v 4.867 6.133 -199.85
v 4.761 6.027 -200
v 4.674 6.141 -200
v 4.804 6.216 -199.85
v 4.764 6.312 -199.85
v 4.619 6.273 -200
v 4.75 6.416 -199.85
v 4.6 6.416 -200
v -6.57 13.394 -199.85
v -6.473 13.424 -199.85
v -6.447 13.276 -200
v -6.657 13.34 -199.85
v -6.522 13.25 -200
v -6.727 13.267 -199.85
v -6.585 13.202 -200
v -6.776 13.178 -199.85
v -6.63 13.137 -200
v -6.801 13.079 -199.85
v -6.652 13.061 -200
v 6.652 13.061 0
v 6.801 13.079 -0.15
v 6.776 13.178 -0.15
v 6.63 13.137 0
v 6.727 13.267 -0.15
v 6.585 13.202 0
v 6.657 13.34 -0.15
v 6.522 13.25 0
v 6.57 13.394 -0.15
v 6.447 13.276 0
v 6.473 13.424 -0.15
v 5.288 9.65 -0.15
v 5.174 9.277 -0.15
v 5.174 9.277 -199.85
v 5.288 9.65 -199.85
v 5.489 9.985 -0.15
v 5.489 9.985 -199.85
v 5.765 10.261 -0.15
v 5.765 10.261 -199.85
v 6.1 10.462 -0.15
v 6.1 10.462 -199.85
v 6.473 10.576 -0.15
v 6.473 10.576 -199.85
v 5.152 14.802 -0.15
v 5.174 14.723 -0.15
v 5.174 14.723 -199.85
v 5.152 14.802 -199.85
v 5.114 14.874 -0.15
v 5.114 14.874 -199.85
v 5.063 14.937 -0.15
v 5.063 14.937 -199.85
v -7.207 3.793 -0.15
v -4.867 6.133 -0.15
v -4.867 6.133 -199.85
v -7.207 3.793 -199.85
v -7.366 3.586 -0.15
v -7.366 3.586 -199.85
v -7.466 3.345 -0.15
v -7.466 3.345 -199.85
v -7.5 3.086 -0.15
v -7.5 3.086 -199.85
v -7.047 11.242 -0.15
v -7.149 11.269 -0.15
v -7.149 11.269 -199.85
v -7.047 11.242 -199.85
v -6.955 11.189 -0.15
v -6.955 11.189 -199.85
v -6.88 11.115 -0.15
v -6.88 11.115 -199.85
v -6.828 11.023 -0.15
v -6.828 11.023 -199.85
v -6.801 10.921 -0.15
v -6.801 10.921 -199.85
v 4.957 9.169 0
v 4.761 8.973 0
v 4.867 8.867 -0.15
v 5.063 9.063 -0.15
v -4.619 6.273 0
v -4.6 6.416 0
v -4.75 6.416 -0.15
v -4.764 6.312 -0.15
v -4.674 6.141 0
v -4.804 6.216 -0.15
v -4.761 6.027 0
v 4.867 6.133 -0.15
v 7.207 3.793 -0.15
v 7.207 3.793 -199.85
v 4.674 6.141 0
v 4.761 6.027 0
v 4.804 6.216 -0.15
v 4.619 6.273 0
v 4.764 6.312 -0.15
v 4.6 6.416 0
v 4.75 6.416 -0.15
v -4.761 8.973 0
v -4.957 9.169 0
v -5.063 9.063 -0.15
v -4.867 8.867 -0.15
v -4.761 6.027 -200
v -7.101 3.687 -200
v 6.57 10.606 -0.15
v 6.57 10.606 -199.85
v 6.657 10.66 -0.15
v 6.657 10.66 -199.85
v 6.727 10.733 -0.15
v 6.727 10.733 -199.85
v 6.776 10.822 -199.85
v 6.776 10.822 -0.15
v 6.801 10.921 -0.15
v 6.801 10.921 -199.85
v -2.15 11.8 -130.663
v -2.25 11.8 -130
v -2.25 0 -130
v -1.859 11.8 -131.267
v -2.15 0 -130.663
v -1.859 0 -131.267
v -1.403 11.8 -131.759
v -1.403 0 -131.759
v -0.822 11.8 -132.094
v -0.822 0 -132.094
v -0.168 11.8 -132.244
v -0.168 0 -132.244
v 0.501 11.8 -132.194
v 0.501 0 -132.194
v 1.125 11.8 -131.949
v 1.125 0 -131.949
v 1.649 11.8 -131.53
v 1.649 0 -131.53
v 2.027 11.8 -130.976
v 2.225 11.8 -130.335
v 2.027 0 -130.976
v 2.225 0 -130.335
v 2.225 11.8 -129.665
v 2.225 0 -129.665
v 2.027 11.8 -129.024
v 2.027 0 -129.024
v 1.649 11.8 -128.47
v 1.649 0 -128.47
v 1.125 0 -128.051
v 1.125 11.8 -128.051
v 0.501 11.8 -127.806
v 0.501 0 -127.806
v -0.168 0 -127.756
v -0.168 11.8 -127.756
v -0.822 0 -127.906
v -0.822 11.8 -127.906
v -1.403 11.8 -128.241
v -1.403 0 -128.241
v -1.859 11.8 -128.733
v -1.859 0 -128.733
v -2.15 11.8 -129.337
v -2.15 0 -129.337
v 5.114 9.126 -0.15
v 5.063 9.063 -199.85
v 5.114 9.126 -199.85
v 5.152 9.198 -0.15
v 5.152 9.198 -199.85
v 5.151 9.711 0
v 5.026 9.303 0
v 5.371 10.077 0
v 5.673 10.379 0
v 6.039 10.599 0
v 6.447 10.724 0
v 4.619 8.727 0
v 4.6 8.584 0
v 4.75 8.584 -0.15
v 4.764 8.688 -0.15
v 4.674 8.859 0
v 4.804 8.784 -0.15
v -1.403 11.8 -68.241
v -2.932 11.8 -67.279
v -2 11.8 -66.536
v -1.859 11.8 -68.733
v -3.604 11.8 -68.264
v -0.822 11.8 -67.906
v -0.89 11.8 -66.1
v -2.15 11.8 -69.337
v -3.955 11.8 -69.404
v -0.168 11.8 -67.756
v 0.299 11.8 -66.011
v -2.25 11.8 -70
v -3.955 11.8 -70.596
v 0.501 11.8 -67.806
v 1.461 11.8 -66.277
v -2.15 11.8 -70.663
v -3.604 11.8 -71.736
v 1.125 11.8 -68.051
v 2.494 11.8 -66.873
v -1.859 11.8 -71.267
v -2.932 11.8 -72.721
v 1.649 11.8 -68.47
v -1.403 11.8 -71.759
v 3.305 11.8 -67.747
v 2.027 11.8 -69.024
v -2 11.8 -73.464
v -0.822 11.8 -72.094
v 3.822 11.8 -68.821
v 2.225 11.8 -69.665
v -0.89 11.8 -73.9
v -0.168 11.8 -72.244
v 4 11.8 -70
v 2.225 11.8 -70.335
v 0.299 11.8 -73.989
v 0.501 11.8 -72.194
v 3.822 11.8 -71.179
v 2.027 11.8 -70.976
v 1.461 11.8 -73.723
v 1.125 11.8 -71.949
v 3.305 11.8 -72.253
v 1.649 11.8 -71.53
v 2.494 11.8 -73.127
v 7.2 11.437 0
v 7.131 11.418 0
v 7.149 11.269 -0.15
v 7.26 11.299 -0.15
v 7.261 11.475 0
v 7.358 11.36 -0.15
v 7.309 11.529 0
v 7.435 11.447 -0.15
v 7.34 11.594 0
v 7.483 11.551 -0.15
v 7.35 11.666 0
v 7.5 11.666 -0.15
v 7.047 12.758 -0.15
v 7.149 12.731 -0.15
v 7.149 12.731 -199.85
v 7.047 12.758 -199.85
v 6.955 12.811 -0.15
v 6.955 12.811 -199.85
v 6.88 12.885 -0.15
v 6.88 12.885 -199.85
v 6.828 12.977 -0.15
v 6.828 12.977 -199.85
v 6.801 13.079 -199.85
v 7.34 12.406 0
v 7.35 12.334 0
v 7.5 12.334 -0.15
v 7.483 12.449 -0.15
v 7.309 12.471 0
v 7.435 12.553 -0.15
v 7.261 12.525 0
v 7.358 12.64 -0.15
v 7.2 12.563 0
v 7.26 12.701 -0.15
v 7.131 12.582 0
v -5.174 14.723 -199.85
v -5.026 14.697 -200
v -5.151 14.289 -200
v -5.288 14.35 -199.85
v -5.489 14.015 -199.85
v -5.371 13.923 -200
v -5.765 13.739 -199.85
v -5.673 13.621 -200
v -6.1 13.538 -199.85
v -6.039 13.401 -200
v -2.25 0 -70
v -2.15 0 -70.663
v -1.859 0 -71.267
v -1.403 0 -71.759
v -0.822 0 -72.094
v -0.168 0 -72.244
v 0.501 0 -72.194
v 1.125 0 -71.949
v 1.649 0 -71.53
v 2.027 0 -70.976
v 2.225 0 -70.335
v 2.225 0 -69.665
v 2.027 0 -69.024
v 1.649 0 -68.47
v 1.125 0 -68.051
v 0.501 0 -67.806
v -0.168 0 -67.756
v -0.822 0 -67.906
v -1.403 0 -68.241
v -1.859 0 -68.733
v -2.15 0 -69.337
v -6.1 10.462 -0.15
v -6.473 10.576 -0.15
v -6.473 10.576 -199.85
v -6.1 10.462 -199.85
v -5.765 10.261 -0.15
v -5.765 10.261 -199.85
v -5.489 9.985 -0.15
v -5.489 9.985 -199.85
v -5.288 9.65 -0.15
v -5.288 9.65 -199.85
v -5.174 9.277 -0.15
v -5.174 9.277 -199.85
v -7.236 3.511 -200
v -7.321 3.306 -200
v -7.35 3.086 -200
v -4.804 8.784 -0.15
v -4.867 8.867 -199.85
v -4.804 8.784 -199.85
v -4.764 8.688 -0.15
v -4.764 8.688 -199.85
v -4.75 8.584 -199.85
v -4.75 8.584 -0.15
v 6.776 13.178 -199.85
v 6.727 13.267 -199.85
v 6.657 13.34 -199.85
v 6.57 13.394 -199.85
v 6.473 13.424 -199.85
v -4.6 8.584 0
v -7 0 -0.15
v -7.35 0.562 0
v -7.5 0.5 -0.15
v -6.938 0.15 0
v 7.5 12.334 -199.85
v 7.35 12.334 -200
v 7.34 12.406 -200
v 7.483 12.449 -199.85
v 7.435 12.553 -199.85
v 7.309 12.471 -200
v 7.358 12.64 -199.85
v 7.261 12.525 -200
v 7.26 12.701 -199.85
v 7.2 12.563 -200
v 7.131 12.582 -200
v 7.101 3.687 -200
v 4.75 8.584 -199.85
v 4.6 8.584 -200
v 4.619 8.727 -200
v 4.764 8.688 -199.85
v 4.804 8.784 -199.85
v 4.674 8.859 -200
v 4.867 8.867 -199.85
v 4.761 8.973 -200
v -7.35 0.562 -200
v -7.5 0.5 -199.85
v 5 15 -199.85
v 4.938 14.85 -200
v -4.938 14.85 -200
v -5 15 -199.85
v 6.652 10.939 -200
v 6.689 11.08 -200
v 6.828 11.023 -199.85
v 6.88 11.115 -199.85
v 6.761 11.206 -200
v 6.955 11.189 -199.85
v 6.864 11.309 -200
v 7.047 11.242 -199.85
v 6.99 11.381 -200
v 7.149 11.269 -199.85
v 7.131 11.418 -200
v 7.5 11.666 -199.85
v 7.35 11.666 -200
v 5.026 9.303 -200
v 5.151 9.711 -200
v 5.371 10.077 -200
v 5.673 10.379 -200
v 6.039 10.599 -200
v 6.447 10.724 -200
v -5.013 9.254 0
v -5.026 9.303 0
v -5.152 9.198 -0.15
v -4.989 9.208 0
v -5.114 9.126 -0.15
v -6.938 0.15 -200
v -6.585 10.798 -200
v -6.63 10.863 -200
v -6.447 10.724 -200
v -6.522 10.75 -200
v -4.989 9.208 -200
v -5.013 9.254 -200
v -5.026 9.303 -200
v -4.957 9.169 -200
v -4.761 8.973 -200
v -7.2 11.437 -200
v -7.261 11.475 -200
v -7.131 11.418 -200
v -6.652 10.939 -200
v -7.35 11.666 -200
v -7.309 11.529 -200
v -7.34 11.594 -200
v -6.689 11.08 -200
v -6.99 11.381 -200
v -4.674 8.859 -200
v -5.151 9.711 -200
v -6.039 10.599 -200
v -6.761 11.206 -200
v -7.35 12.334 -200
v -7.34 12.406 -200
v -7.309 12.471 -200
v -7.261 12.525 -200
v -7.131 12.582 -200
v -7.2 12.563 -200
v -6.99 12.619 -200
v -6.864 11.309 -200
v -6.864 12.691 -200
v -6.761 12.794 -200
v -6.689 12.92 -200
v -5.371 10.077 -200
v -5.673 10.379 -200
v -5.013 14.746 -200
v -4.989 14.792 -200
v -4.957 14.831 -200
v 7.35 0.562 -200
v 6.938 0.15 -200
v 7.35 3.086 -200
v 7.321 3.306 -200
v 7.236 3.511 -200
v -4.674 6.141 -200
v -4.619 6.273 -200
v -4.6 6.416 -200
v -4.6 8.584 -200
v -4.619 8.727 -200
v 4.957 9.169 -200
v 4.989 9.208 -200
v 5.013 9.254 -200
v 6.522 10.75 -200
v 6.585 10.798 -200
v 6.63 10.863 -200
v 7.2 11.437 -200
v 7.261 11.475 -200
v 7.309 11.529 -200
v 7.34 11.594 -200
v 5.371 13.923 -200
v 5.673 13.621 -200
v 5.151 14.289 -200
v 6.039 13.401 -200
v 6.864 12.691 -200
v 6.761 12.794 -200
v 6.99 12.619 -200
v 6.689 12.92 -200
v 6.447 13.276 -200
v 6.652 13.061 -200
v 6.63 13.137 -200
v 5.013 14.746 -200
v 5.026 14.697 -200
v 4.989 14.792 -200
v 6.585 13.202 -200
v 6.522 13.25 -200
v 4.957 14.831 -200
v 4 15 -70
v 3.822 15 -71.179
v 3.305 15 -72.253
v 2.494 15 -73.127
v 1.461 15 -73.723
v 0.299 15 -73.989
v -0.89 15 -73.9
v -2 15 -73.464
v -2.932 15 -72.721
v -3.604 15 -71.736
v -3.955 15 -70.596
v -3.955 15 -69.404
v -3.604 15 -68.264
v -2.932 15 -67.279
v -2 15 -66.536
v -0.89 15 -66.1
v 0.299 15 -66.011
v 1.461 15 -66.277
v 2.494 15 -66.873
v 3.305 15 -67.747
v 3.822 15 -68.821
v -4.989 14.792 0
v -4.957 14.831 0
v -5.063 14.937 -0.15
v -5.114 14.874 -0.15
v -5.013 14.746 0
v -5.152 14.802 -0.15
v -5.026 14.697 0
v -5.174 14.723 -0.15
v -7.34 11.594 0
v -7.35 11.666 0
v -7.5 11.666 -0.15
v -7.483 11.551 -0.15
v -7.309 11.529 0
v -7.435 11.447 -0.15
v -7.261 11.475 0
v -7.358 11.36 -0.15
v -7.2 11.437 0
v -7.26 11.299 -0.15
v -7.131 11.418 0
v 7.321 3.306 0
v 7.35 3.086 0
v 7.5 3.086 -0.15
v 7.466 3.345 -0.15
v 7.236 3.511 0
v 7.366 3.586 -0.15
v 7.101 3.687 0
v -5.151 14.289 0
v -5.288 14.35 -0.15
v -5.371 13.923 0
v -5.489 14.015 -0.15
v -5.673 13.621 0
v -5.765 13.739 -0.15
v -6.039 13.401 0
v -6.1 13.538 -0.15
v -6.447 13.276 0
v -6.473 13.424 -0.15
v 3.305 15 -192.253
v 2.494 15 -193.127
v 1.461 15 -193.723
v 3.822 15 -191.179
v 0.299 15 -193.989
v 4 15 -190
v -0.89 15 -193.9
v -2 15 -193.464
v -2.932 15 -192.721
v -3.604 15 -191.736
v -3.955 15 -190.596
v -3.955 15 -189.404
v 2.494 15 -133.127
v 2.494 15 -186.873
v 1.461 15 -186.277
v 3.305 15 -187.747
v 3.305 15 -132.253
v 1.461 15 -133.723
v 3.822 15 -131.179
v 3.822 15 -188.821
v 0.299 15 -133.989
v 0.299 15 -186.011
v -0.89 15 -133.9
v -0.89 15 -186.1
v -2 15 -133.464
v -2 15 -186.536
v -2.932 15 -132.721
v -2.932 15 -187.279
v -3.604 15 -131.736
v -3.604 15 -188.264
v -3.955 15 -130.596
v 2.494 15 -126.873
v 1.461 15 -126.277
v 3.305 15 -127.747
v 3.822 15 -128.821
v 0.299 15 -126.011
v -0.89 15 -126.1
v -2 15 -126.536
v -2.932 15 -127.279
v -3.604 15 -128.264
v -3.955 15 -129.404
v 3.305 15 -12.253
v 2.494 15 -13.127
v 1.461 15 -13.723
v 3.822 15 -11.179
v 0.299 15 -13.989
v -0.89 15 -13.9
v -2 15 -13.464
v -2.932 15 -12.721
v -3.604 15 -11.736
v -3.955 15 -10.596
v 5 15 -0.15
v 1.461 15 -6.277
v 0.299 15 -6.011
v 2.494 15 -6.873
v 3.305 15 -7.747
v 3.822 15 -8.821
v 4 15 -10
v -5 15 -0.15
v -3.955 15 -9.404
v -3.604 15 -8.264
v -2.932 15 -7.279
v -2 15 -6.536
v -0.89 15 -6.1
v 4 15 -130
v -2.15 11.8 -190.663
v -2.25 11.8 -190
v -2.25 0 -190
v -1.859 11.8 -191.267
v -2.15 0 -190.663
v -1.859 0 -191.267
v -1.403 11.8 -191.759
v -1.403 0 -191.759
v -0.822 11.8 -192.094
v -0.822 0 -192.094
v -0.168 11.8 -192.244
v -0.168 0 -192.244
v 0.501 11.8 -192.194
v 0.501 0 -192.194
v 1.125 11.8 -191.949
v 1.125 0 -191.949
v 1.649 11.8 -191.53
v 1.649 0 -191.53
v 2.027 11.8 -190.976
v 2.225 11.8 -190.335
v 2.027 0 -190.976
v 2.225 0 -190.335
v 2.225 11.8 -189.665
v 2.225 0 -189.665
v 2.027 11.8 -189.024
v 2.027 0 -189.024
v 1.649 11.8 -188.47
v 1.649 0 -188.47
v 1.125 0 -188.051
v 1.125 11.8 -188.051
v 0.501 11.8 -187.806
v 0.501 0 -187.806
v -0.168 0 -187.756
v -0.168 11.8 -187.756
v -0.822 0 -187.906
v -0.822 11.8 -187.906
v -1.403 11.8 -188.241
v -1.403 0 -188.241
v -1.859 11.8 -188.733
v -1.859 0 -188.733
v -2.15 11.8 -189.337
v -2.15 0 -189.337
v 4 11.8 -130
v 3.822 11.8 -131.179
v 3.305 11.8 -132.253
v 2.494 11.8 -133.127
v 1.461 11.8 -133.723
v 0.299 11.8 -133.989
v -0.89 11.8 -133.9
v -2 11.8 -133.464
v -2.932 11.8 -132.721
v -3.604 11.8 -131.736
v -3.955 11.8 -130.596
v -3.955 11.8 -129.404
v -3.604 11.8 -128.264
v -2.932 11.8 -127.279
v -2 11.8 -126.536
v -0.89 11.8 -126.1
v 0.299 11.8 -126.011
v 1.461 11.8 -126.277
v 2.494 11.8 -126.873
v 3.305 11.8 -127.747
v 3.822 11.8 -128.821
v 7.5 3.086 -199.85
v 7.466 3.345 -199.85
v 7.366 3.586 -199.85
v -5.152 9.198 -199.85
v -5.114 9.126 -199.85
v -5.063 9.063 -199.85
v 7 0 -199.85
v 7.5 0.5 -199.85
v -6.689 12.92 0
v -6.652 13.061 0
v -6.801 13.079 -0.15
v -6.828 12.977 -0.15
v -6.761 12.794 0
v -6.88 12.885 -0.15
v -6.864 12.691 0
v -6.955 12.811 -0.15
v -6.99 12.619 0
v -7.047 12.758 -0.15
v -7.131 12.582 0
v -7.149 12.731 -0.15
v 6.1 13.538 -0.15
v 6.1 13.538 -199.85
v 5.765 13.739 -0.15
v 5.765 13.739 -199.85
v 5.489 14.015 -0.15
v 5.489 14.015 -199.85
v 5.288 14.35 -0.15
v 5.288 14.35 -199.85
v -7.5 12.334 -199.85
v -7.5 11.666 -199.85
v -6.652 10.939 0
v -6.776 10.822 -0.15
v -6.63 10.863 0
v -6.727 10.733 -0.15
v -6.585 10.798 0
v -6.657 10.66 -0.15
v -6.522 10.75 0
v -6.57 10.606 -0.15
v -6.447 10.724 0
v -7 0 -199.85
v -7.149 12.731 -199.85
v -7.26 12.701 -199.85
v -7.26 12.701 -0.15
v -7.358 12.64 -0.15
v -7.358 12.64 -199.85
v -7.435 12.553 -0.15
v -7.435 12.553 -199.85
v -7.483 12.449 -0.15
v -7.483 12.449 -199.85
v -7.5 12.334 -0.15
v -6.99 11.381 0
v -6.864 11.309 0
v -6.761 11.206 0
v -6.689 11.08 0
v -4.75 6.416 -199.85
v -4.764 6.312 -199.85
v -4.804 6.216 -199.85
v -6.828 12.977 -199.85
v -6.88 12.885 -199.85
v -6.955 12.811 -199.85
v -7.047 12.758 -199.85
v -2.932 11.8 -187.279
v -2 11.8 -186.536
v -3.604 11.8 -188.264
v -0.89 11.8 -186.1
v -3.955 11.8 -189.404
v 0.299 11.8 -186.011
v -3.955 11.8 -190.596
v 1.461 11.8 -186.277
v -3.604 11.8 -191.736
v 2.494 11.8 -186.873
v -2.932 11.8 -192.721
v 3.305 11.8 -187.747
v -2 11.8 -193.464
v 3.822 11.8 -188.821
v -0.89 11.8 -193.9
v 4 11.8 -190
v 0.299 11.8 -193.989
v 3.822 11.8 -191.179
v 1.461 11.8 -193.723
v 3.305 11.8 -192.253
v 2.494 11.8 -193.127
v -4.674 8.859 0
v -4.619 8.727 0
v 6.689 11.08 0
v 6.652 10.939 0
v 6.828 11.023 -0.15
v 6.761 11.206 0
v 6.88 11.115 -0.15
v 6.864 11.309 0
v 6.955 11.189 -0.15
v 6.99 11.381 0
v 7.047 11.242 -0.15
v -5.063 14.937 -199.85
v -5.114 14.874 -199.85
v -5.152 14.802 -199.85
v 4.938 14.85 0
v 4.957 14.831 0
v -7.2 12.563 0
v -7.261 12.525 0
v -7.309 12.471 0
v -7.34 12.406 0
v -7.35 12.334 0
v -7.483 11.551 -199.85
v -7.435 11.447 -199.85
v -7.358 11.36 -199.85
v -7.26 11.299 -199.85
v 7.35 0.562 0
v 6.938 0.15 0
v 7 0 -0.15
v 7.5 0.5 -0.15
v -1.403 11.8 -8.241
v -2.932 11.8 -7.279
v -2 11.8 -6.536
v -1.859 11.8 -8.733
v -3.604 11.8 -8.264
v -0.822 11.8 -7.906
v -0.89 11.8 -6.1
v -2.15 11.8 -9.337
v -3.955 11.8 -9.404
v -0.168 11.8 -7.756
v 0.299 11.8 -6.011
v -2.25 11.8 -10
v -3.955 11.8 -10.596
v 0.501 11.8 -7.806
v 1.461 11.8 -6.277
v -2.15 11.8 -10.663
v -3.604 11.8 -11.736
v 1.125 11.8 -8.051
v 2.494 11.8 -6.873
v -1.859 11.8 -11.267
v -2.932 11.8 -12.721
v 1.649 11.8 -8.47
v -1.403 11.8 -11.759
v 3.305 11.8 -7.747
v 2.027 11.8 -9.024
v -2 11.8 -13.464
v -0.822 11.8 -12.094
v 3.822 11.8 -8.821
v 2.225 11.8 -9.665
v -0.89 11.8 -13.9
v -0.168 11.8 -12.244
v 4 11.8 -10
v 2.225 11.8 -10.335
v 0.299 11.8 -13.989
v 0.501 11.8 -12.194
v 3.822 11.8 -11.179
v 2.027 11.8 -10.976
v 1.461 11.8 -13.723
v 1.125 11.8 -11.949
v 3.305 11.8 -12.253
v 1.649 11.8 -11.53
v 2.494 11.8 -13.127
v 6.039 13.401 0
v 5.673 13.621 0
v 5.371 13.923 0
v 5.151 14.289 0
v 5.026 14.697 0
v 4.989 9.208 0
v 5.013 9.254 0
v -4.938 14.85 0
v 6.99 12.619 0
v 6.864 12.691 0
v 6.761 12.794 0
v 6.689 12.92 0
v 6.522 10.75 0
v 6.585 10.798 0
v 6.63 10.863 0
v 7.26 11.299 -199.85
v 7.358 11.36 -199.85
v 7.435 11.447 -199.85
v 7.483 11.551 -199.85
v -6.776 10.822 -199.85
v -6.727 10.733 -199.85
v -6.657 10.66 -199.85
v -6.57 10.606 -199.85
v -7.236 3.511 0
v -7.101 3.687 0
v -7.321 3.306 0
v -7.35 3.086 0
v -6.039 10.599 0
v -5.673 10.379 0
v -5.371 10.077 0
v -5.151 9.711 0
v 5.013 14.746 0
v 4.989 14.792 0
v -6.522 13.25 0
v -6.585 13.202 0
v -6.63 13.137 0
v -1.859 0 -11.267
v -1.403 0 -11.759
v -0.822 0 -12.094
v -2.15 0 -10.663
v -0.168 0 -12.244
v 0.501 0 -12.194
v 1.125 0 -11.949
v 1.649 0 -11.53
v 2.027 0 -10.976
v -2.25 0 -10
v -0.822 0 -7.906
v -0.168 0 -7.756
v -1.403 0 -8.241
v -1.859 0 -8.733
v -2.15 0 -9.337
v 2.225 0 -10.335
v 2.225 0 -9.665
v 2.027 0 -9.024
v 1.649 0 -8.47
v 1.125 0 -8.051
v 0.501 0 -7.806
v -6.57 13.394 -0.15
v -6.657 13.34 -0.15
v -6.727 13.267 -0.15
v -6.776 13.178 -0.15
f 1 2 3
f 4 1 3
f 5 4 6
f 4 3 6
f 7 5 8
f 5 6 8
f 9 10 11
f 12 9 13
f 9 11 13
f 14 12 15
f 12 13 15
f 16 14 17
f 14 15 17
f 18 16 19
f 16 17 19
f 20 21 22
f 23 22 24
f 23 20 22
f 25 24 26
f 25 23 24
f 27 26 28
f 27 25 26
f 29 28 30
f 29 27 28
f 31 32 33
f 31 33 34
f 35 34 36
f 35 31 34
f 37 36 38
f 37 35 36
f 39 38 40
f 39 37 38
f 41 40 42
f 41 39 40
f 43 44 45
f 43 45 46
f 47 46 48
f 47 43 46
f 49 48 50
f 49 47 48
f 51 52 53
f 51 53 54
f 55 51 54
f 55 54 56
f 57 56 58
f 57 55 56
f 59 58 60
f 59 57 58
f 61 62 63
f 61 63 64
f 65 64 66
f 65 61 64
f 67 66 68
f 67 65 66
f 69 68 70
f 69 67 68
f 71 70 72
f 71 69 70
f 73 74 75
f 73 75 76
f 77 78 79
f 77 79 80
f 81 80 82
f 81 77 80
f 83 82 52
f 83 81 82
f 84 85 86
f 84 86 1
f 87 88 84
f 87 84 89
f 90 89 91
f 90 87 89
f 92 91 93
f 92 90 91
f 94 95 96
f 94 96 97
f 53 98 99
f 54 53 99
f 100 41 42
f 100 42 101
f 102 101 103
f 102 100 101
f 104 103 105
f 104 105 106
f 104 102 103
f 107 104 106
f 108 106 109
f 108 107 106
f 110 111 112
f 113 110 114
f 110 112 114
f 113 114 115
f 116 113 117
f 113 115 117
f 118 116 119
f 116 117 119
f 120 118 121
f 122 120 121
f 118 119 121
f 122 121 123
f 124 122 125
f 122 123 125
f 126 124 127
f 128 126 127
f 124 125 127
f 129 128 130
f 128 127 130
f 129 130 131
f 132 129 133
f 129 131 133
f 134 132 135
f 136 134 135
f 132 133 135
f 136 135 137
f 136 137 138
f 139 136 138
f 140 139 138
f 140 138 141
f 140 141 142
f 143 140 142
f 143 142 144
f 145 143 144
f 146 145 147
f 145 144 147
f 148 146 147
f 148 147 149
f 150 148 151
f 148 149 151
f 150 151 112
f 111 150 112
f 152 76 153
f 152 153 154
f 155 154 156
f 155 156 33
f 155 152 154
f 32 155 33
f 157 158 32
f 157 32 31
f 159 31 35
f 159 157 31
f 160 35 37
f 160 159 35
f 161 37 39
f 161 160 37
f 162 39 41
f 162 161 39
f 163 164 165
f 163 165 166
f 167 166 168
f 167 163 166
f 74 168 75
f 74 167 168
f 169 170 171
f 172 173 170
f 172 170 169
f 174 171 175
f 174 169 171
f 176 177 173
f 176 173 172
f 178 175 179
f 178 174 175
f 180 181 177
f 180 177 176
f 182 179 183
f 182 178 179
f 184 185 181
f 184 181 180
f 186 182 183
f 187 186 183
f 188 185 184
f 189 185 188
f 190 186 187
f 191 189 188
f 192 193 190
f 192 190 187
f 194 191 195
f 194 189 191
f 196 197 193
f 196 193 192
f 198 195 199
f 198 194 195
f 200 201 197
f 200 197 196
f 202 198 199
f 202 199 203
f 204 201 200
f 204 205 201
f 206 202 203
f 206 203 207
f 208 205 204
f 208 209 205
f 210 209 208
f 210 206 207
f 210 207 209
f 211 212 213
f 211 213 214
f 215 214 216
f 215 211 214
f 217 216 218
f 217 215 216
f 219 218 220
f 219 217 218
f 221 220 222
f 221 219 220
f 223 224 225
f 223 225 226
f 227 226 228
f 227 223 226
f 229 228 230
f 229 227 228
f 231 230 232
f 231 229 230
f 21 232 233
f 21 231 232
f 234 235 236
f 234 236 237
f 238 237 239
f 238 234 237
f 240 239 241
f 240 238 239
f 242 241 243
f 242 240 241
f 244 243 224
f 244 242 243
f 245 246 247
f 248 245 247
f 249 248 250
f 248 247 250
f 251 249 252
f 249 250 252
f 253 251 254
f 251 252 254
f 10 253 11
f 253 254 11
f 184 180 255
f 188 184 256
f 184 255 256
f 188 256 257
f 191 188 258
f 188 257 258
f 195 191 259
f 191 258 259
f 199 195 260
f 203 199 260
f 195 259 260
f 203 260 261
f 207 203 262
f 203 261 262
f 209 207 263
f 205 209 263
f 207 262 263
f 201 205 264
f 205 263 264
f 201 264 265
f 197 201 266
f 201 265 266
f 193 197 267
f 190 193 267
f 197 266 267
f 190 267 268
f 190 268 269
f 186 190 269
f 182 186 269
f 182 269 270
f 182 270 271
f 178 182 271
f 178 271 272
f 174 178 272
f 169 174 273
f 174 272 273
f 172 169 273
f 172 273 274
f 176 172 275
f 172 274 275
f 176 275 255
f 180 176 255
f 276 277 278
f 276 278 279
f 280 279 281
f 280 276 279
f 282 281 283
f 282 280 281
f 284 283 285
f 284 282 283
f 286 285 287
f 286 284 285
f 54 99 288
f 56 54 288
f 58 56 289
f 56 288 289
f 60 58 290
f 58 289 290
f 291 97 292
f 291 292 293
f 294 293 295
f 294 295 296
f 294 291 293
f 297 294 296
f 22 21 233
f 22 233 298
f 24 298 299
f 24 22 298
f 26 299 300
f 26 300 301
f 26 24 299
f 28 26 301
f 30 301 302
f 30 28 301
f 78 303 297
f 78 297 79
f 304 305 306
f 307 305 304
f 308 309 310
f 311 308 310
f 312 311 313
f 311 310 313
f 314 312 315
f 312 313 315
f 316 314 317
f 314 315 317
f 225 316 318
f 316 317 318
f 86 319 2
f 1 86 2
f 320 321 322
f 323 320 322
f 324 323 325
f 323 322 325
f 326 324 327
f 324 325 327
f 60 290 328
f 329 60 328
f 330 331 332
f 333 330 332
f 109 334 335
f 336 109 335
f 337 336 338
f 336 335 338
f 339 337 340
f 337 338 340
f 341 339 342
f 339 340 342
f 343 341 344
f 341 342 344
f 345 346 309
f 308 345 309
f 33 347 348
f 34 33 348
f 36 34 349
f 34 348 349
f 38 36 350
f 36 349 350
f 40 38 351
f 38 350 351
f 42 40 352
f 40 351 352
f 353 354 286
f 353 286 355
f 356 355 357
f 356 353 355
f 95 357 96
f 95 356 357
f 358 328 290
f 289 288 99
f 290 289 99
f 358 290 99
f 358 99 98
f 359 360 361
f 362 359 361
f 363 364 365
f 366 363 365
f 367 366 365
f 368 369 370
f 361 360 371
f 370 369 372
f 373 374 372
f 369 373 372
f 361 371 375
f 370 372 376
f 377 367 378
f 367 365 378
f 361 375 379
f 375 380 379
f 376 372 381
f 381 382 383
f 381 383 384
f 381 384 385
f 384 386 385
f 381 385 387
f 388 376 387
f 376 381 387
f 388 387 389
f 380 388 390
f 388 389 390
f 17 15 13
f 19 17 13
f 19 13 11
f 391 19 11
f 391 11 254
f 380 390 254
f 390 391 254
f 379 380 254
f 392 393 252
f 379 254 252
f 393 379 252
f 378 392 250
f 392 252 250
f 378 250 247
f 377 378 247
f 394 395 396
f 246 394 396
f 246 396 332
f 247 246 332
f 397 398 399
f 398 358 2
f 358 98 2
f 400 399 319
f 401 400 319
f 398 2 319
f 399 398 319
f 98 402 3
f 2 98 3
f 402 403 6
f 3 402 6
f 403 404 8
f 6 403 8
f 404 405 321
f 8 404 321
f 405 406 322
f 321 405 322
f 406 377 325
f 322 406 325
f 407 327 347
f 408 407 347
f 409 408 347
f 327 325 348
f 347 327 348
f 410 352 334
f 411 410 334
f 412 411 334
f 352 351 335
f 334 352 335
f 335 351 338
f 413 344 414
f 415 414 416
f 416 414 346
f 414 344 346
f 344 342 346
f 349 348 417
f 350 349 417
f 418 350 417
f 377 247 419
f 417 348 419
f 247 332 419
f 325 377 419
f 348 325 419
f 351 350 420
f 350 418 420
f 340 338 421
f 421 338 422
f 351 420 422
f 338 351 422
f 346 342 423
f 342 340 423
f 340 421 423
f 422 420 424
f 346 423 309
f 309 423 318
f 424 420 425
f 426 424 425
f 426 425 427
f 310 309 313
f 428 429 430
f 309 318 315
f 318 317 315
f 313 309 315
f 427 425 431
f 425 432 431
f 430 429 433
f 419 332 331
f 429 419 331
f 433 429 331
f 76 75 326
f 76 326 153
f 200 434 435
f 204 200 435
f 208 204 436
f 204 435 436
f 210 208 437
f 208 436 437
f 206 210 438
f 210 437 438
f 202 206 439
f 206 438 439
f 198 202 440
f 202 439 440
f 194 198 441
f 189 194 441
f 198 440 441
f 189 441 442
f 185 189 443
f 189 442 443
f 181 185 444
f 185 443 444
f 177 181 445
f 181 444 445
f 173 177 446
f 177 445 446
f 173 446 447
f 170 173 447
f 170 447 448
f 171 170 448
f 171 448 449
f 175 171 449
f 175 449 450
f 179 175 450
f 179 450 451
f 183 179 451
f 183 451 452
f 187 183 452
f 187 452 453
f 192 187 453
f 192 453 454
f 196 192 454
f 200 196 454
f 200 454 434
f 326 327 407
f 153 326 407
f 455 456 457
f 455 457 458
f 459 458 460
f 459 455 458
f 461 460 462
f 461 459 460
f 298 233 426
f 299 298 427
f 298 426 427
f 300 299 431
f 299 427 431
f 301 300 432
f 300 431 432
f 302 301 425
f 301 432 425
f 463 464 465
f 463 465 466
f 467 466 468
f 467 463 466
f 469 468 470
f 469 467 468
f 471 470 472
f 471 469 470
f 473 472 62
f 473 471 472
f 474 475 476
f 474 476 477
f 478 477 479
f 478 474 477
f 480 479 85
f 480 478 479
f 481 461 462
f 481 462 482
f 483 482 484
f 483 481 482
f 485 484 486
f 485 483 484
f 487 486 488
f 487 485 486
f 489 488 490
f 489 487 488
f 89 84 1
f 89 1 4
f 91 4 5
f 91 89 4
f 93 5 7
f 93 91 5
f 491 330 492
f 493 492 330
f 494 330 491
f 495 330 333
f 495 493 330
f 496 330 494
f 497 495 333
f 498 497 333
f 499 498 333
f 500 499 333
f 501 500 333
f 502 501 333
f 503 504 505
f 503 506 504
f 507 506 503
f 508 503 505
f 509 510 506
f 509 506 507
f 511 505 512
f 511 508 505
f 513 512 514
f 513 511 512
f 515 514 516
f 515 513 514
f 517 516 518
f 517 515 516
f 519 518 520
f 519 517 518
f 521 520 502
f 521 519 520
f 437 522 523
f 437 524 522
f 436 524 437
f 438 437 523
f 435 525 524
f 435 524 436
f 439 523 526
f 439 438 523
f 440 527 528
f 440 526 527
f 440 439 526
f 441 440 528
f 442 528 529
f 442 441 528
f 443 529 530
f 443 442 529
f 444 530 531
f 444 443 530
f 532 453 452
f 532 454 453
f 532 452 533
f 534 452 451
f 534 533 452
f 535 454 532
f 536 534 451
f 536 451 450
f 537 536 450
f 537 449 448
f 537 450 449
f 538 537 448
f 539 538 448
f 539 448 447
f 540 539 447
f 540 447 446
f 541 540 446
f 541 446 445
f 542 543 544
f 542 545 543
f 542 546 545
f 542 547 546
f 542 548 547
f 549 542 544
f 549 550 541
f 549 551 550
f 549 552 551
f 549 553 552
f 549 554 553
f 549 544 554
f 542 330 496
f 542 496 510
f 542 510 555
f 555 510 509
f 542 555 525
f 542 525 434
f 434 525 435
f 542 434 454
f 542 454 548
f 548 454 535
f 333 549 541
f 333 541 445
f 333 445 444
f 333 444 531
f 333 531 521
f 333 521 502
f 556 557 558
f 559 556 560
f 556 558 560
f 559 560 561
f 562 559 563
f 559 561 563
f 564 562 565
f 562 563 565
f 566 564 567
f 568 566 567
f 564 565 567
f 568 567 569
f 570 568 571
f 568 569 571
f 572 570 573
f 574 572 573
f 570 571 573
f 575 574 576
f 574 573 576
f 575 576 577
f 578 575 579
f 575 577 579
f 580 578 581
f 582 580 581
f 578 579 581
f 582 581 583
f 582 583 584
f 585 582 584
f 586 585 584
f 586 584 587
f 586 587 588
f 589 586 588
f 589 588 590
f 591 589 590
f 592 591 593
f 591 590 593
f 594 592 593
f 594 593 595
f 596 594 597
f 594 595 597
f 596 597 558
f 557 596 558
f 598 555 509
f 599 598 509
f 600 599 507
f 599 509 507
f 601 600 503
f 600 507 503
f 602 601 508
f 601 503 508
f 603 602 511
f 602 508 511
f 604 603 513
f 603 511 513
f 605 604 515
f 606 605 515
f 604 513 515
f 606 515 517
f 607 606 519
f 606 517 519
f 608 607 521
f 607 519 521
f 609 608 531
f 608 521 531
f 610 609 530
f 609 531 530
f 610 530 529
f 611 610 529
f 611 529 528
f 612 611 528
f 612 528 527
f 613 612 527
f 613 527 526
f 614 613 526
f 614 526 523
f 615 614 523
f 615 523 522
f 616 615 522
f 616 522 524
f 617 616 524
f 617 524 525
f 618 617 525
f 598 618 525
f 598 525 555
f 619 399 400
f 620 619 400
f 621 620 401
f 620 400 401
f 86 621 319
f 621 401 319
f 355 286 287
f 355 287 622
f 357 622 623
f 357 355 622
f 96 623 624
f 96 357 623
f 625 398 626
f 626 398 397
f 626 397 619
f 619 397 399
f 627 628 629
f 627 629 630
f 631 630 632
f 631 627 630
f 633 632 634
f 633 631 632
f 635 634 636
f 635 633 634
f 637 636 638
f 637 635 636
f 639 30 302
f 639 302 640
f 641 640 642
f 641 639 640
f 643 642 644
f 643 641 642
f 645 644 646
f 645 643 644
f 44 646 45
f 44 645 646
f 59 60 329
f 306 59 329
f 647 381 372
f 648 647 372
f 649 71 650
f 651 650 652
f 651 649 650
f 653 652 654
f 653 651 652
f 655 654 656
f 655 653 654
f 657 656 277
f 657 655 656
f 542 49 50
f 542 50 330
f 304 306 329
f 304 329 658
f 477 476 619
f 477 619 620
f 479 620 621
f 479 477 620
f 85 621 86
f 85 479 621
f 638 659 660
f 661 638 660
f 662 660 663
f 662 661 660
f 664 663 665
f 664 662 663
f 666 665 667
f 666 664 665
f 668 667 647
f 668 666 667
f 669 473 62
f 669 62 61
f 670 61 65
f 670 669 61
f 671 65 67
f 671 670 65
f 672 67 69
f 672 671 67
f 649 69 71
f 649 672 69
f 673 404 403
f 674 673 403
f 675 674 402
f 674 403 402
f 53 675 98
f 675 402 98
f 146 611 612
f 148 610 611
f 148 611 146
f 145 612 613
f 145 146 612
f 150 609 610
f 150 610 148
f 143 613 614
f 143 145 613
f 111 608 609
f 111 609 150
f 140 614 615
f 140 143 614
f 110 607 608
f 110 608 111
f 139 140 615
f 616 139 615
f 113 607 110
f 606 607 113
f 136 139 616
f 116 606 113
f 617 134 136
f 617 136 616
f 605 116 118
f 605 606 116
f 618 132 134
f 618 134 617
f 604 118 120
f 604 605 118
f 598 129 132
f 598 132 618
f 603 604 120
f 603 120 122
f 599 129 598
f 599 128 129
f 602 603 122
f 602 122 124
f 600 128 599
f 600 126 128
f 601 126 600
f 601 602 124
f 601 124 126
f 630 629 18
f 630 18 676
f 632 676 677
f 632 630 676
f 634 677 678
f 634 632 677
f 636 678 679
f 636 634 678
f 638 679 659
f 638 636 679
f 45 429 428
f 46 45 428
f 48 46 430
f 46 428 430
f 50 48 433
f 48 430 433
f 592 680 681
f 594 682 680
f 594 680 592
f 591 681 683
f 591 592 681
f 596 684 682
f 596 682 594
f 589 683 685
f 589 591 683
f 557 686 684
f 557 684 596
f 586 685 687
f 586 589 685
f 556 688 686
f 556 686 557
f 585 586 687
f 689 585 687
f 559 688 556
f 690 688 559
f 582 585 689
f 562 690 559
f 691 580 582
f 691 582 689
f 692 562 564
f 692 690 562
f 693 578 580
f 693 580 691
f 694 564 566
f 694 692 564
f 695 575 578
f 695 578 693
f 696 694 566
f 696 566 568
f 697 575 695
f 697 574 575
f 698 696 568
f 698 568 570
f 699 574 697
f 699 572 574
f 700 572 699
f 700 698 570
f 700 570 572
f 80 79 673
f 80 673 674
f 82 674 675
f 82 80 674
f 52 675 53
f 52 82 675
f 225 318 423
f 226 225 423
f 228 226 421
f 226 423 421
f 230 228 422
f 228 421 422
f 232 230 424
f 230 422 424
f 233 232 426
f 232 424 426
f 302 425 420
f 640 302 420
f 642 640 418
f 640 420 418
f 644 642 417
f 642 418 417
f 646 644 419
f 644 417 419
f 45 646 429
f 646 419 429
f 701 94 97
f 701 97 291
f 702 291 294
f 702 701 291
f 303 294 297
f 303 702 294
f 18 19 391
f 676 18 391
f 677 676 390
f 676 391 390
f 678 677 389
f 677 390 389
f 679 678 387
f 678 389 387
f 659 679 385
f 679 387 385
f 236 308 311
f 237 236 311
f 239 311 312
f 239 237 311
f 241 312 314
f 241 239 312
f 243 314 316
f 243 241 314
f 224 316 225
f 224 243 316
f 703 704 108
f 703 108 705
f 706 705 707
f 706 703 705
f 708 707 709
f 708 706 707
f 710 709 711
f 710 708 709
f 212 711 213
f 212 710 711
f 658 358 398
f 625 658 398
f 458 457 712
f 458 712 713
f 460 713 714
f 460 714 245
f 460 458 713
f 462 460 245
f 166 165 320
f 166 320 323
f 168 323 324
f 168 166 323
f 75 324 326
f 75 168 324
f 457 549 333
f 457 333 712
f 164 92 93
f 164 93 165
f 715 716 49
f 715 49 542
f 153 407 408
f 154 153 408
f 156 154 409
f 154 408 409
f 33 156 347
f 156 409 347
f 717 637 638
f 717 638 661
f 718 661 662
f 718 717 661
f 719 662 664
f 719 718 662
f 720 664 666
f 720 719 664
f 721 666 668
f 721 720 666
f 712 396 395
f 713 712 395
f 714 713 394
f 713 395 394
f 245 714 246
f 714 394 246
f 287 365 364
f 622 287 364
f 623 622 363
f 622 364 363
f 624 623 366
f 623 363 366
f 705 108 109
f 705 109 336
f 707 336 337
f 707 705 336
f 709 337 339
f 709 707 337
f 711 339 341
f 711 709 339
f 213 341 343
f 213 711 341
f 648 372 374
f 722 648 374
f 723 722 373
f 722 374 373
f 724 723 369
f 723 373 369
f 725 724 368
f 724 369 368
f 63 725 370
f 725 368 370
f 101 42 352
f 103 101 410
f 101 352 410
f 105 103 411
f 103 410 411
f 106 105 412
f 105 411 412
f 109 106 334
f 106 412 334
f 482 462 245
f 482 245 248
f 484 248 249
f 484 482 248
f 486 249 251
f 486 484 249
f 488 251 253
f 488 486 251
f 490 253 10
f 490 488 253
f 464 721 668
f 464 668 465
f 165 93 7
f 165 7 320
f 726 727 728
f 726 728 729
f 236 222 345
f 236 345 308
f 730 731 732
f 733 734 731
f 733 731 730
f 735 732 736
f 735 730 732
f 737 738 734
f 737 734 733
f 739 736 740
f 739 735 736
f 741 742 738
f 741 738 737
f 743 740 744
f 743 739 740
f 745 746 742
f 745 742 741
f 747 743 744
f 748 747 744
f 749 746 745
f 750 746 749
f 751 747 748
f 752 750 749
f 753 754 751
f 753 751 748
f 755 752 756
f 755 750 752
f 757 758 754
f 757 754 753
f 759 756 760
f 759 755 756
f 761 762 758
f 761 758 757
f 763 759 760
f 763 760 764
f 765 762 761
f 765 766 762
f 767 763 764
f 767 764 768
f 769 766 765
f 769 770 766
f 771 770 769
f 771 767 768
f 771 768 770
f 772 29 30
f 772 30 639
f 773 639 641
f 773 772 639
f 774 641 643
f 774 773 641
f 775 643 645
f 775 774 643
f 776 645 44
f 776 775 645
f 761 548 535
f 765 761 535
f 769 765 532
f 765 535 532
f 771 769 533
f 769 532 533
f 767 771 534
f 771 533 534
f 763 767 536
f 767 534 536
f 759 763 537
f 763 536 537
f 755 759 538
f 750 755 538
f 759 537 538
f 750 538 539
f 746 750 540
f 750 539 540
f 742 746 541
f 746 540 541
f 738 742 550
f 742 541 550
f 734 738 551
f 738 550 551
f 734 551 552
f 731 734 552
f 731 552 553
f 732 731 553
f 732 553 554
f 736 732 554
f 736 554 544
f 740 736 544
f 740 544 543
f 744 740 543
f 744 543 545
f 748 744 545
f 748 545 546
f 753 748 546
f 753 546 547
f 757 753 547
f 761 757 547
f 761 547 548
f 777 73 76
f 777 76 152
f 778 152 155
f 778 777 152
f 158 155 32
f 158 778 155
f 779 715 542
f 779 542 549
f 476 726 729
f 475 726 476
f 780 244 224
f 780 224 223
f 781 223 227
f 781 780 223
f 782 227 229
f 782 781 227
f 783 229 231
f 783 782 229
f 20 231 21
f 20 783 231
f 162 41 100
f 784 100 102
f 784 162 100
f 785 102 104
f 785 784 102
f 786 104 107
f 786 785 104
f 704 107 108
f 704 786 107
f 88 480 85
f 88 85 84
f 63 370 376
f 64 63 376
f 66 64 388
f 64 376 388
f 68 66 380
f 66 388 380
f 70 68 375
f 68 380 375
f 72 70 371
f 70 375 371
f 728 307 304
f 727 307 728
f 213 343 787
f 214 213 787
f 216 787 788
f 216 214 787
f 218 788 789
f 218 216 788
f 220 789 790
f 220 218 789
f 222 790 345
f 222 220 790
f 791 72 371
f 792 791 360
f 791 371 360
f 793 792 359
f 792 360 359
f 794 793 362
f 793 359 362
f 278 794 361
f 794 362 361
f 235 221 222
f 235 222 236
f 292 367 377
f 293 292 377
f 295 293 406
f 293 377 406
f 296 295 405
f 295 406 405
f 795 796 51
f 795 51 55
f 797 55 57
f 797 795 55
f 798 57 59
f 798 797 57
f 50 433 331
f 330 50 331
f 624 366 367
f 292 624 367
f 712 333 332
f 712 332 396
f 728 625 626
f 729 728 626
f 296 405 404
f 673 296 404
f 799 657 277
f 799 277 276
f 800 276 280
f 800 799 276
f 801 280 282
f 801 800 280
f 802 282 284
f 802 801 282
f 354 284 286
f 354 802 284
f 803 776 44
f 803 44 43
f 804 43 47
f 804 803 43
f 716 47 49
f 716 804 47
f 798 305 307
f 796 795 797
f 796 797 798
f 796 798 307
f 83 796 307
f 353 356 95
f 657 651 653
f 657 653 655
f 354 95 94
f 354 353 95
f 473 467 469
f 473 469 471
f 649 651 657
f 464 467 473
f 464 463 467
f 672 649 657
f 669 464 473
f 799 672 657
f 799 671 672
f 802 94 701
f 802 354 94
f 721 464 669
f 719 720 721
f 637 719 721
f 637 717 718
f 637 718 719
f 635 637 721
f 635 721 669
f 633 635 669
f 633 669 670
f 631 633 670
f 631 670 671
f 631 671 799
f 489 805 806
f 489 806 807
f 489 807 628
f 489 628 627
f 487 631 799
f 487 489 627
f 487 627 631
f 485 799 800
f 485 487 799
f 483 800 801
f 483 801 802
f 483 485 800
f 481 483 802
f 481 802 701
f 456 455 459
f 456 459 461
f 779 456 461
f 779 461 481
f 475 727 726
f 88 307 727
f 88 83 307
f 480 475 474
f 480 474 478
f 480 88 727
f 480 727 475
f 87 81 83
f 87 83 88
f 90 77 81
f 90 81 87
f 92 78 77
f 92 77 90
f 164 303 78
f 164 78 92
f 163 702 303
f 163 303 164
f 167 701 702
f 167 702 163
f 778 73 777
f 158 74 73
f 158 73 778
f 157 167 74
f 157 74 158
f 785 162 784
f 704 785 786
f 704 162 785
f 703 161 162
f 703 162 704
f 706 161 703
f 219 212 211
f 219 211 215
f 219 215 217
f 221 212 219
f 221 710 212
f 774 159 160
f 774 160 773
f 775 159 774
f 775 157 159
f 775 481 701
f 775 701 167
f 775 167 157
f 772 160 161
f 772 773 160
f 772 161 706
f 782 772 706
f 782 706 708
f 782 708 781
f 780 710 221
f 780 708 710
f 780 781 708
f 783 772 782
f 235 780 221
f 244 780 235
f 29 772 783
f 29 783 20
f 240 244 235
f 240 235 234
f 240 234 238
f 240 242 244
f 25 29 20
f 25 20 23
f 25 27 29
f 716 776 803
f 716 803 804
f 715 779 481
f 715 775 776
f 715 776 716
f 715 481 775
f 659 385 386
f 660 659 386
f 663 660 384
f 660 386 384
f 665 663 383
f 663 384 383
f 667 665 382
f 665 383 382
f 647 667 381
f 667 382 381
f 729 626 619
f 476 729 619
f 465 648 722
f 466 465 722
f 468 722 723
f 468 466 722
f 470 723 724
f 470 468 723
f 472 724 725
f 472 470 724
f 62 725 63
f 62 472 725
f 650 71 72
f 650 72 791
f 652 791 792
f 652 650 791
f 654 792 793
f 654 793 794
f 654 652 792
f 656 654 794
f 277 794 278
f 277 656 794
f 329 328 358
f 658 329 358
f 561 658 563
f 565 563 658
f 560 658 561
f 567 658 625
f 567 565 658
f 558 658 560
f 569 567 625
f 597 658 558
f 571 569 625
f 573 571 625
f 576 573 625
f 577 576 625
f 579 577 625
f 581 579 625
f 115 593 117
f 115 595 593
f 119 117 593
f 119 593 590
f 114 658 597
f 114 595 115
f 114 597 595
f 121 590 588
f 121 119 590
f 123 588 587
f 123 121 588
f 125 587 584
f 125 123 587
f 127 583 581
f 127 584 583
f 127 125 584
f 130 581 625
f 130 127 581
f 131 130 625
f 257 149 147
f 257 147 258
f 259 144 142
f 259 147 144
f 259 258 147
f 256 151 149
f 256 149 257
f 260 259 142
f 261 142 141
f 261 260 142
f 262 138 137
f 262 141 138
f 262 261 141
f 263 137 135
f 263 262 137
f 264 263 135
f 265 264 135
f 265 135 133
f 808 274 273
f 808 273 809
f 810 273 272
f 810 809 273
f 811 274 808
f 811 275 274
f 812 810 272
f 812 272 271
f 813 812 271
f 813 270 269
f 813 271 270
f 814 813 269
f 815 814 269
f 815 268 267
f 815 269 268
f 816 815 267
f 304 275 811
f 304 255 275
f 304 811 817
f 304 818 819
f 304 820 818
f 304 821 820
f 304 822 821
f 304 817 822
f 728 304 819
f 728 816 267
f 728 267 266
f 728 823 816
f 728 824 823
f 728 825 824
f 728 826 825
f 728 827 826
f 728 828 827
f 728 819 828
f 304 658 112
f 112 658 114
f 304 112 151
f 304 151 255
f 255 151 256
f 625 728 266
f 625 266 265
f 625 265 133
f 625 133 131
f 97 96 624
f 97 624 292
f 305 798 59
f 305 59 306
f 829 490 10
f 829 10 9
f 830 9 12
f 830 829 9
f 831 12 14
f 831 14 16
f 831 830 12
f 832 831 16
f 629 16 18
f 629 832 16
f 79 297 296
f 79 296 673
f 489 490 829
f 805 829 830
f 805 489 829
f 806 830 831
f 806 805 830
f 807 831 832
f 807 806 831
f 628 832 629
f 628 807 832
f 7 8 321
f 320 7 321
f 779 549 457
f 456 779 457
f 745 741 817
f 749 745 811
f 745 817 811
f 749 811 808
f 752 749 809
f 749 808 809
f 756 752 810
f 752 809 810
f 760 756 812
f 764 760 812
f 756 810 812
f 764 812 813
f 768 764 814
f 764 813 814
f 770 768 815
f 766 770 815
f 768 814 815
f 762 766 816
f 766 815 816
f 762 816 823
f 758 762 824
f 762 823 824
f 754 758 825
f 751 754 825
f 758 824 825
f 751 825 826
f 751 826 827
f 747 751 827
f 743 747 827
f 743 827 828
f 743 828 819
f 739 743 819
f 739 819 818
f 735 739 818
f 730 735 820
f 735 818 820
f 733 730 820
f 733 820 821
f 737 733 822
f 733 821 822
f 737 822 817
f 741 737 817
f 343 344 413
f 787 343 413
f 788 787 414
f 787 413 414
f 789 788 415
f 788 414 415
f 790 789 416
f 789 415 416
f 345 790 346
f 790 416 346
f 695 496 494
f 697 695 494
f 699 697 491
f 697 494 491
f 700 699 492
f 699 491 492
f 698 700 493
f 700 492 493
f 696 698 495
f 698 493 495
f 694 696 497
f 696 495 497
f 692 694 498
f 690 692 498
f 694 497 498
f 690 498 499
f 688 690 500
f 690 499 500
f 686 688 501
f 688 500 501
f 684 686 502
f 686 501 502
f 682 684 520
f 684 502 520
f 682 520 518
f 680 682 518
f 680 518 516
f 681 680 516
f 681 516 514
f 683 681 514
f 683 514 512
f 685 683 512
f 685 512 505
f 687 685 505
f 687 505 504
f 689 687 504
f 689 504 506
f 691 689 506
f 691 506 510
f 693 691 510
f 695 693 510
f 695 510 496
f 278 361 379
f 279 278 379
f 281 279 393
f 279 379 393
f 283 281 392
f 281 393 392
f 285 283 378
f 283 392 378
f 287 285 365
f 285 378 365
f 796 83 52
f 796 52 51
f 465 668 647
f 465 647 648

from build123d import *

# Parameters (mm, degrees)
BODY_DEPTH                                          = 200
AESTHETIC_CHAMFER_SIZE                              = 0.15
CBORE_FOR_M4_HEX_SOCKET_HEAD_CAP_SCREW1_D           = 4.5
CBORE_FOR_M4_HEX_SOCKET_HEAD_CAP_SCREW1_CBORE_D     = 8
CBORE_FOR_M4_HEX_SOCKET_HEAD_CAP_SCREW1_CBORE_DEPTH = 3.2
LPATTERN1_COUNT                                     = 4
LPATTERN1_PITCH                                     = 60


with BuildPart() as part:
    # Rail Profile → Body (new body)
    with BuildSketch(Plane.XY):
        with BuildLine():
            Line((-7, 0), (7, 0))
            Line((7, 0), (7.5, 0.5))
            Line((7.5, 0.5), (7.5, 3.085786438))
            ThreePointArc((7.5, 3.085786438), (7.423879533, 3.46846987), (7.207106781, 3.792893219))
            Line((7.207106781, 3.792893219), (4.867157288, 6.132842712))
            ThreePointArc((4.867157288, 6.132842712), (4.780448187, 6.262612052), (4.75, 6.415685425))
            Line((4.75, 6.415685425), (4.75, 8.584314575))
            ThreePointArc((4.75, 8.584314575), (4.780448187, 8.737387948), (4.867157288, 8.867157288))
            Line((4.867157288, 8.867157288), (5.062965362, 9.062965362))
            ThreePointArc((5.062965362, 9.062965362), (5.134996734, 9.161242682), (5.17409812, 9.27664646))
            ThreePointArc((5.17409812, 9.27664646), (5.61862915, 10.13137085), (6.47335354, 10.57590188))
            ThreePointArc((6.47335354, 10.57590188), (6.694124352, 10.694306692), (6.801170165, 10.920803148))
            ThreePointArc((6.801170165, 10.920803148), (6.915305692, 11.154571658), (7.149074202, 11.268707185))
            ThreePointArc((7.149074202, 11.268707185), (7.399691242, 11.400760606), (7.5, 11.665685425))
            Line((7.5, 11.665685425), (7.5, 12.334314575))
            ThreePointArc((7.5, 12.334314575), (7.399691242, 12.599239394), (7.149074202, 12.731292815))
            ThreePointArc((7.149074202, 12.731292815), (6.915305692, 12.845428342), (6.801170165, 13.079196852))
            ThreePointArc((6.801170165, 13.079196852), (6.694124352, 13.305693308), (6.47335354, 13.42409812))
            ThreePointArc((6.47335354, 13.42409812), (5.61862915, 13.86862915), (5.17409812, 14.72335354))
            ThreePointArc((5.17409812, 14.72335354), (5.134996734, 14.838757318), (5.062965362, 14.937034638))
            Line((5.062965362, 14.937034638), (5, 15))
            Line((5, 15), (-5, 15))
            Line((-5, 15), (-5.062965362, 14.937034638))
            ThreePointArc((-5.062965362, 14.937034638), (-5.134996734, 14.838757318), (-5.17409812, 14.72335354))
            ThreePointArc((-5.17409812, 14.72335354), (-5.61862915, 13.86862915), (-6.47335354, 13.42409812))
            ThreePointArc((-6.47335354, 13.42409812), (-6.694124352, 13.305693308), (-6.801170165, 13.079196852))
            ThreePointArc((-6.801170165, 13.079196852), (-6.915305692, 12.845428342), (-7.149074202, 12.731292815))
            ThreePointArc((-7.149074202, 12.731292815), (-7.399691242, 12.599239394), (-7.5, 12.334314575))
            Line((-7.5, 12.334314575), (-7.5, 11.665685425))
            ThreePointArc((-7.5, 11.665685425), (-7.399691242, 11.400760606), (-7.149074202, 11.268707185))
            ThreePointArc((-7.149074202, 11.268707185), (-6.915305692, 11.154571658), (-6.801170165, 10.920803148))
            ThreePointArc((-6.801170165, 10.920803148), (-6.694124352, 10.694306692), (-6.47335354, 10.57590188))
            ThreePointArc((-6.47335354, 10.57590188), (-5.61862915, 10.13137085), (-5.17409812, 9.27664646))
            ThreePointArc((-5.17409812, 9.27664646), (-5.134996734, 9.161242682), (-5.062965362, 9.062965362))
            Line((-5.062965362, 9.062965362), (-4.867157288, 8.867157288))
            ThreePointArc((-4.867157288, 8.867157288), (-4.780448187, 8.737387948), (-4.75, 8.584314575))
            Line((-4.75, 8.584314575), (-4.75, 6.415685425))
            ThreePointArc((-4.75, 6.415685425), (-4.780448187, 6.262612052), (-4.867157288, 6.132842712))
            Line((-4.867157288, 6.132842712), (-7.207106781, 3.792893219))
            ThreePointArc((-7.207106781, 3.792893219), (-7.423879533, 3.46846987), (-7.5, 3.085786438))
            Line((-7.5, 3.085786438), (-7.5, 0.5))
            Line((-7.5, 0.5), (-7, 0))
        make_face()
    extrude(amount=-BODY_DEPTH)

    # Aesthetic Chamfer
    aesthetic_chamfer_edges = [part.edges().sort_by_distance(p)[0] for p in [
        (7.423879533, 3.46846987, -200),
        (-5.134996734, 9.161242682, -200),
        (-4.965061325, 8.965061325, -200),
        (-4.780448187, 8.737387948, -200),
        (-4.75, 7.5, -200),
        (-4.780448187, 6.262612052, -200),
        (-6.037132034, 4.962867966, -200),
        (-7.423879533, 3.46846987, -200),
        (-7.5, 1.792893219, -200),
        (-7.25, 0.25, -200),
        (0, 0, -200),
        (6.037132034, 4.962867966, -200),
        (4.780448187, 6.262612052, -200),
        (4.75, 7.5, -200),
        (4.780448187, 8.737387948, -200),
        (4.965061325, 8.965061325, -200),
        (5.134996734, 9.161242682, -200),
        (5.61862915, 10.13137085, -200),
        (6.694124352, 10.694306692, -200),
        (0, 0, 0),
        (-7.25, 0.25, 0),
        (-7.5, 1.792893219, 0),
        (-7.423879533, 3.46846987, 0),
        (-6.037132034, 4.962867966, 0),
        (-4.780448187, 6.262612052, 0),
        (6.915305692, 11.154571658, -200),
        (-4.75, 7.5, 0),
        (-4.780448187, 8.737387948, 0),
        (-4.965061325, 8.965061325, 0),
        (-5.134996734, 9.161242682, 0),
        (-5.61862915, 10.13137085, 0),
        (-6.694124352, 10.694306692, 0),
        (-6.915305692, 11.154571658, 0),
        (7.25, 0.25, -200),
        (7.399691242, 11.400760606, -200),
        (-7.399691242, 11.400760606, 0),
        (-7.5, 12, 0),
        (-7.399691242, 12.599239394, 0),
        (-6.915305692, 12.845428342, 0),
        (-6.694124352, 13.305693308, 0),
        (-5.61862915, 13.86862915, 0),
        (-5.134996734, 14.838757318, 0),
        (-5.031482681, 14.968517319, 0),
        (7.5, 12, -200),
        (0, 15, 0),
        (5.031482681, 14.968517319, 0),
        (5.134996734, 14.838757318, 0),
        (5.61862915, 13.86862915, 0),
        (6.694124352, 13.305693308, 0),
        (6.915305692, 12.845428342, 0),
        (7.399691242, 12.599239394, 0),
        (7.399691242, 12.599239394, -200),
        (7.5, 12, 0),
        (7.399691242, 11.400760606, 0),
        (6.915305692, 11.154571658, 0),
        (6.694124352, 10.694306692, 0),
        (5.61862915, 10.13137085, 0),
        (5.134996734, 9.161242682, 0),
        (4.965061325, 8.965061325, 0),
        (4.780448187, 8.737387948, 0),
        (6.915305692, 12.845428342, -200),
        (4.75, 7.5, 0),
        (4.780448187, 6.262612052, 0),
        (6.037132034, 4.962867966, 0),
        (7.423879533, 3.46846987, 0),
        (7.5, 1.792893219, 0),
        (7.25, 0.25, 0),
        (6.694124352, 13.305693308, -200),
        (5.61862915, 13.86862915, -200),
        (5.134996734, 14.838757318, -200),
        (5.031482681, 14.968517319, -200),
        (0, 15, -200),
        (-5.031482681, 14.968517319, -200),
        (7.5, 1.792893219, -200),
        (-5.134996734, 14.838757318, -200),
        (-5.61862915, 13.86862915, -200),
        (-6.694124352, 13.305693308, -200),
        (-6.915305692, 12.845428342, -200),
        (-7.399691242, 12.599239394, -200),
        (-7.5, 12, -200),
        (-7.399691242, 11.400760606, -200),
        (-6.915305692, 11.154571658, -200),
        (-6.694124352, 10.694306692, -200),
        (-5.61862915, 10.13137085, -200),
    ]]
    chamfer(aesthetic_chamfer_edges, length=AESTHETIC_CHAMFER_SIZE)

    # CBORE for M4 Hex Socket Head Cap Screw1 (through all)
    with Locations(Plane(origin=(0, 15, 0), x_dir=(1, 0, 0), z_dir=(0, 1, 0))):
        with Locations((0, 10)):
            cbore_for_m4_hex_socket_head_cap_screw1 = CounterBoreHole(CBORE_FOR_M4_HEX_SOCKET_HEAD_CAP_SCREW1_D / 2, CBORE_FOR_M4_HEX_SOCKET_HEAD_CAP_SCREW1_CBORE_D / 2, CBORE_FOR_M4_HEX_SOCKET_HEAD_CAP_SCREW1_CBORE_DEPTH)

    # LPattern1: CBORE for M4 Hex Socket Head Cap Screw1 ×4
    with Locations(*[(0, 0, -i * LPATTERN1_PITCH) for i in range(1, LPATTERN1_COUNT)]):
        add(cbore_for_m4_hex_socket_head_cap_screw1, mode=Mode.SUBTRACT)


solid = part.part
